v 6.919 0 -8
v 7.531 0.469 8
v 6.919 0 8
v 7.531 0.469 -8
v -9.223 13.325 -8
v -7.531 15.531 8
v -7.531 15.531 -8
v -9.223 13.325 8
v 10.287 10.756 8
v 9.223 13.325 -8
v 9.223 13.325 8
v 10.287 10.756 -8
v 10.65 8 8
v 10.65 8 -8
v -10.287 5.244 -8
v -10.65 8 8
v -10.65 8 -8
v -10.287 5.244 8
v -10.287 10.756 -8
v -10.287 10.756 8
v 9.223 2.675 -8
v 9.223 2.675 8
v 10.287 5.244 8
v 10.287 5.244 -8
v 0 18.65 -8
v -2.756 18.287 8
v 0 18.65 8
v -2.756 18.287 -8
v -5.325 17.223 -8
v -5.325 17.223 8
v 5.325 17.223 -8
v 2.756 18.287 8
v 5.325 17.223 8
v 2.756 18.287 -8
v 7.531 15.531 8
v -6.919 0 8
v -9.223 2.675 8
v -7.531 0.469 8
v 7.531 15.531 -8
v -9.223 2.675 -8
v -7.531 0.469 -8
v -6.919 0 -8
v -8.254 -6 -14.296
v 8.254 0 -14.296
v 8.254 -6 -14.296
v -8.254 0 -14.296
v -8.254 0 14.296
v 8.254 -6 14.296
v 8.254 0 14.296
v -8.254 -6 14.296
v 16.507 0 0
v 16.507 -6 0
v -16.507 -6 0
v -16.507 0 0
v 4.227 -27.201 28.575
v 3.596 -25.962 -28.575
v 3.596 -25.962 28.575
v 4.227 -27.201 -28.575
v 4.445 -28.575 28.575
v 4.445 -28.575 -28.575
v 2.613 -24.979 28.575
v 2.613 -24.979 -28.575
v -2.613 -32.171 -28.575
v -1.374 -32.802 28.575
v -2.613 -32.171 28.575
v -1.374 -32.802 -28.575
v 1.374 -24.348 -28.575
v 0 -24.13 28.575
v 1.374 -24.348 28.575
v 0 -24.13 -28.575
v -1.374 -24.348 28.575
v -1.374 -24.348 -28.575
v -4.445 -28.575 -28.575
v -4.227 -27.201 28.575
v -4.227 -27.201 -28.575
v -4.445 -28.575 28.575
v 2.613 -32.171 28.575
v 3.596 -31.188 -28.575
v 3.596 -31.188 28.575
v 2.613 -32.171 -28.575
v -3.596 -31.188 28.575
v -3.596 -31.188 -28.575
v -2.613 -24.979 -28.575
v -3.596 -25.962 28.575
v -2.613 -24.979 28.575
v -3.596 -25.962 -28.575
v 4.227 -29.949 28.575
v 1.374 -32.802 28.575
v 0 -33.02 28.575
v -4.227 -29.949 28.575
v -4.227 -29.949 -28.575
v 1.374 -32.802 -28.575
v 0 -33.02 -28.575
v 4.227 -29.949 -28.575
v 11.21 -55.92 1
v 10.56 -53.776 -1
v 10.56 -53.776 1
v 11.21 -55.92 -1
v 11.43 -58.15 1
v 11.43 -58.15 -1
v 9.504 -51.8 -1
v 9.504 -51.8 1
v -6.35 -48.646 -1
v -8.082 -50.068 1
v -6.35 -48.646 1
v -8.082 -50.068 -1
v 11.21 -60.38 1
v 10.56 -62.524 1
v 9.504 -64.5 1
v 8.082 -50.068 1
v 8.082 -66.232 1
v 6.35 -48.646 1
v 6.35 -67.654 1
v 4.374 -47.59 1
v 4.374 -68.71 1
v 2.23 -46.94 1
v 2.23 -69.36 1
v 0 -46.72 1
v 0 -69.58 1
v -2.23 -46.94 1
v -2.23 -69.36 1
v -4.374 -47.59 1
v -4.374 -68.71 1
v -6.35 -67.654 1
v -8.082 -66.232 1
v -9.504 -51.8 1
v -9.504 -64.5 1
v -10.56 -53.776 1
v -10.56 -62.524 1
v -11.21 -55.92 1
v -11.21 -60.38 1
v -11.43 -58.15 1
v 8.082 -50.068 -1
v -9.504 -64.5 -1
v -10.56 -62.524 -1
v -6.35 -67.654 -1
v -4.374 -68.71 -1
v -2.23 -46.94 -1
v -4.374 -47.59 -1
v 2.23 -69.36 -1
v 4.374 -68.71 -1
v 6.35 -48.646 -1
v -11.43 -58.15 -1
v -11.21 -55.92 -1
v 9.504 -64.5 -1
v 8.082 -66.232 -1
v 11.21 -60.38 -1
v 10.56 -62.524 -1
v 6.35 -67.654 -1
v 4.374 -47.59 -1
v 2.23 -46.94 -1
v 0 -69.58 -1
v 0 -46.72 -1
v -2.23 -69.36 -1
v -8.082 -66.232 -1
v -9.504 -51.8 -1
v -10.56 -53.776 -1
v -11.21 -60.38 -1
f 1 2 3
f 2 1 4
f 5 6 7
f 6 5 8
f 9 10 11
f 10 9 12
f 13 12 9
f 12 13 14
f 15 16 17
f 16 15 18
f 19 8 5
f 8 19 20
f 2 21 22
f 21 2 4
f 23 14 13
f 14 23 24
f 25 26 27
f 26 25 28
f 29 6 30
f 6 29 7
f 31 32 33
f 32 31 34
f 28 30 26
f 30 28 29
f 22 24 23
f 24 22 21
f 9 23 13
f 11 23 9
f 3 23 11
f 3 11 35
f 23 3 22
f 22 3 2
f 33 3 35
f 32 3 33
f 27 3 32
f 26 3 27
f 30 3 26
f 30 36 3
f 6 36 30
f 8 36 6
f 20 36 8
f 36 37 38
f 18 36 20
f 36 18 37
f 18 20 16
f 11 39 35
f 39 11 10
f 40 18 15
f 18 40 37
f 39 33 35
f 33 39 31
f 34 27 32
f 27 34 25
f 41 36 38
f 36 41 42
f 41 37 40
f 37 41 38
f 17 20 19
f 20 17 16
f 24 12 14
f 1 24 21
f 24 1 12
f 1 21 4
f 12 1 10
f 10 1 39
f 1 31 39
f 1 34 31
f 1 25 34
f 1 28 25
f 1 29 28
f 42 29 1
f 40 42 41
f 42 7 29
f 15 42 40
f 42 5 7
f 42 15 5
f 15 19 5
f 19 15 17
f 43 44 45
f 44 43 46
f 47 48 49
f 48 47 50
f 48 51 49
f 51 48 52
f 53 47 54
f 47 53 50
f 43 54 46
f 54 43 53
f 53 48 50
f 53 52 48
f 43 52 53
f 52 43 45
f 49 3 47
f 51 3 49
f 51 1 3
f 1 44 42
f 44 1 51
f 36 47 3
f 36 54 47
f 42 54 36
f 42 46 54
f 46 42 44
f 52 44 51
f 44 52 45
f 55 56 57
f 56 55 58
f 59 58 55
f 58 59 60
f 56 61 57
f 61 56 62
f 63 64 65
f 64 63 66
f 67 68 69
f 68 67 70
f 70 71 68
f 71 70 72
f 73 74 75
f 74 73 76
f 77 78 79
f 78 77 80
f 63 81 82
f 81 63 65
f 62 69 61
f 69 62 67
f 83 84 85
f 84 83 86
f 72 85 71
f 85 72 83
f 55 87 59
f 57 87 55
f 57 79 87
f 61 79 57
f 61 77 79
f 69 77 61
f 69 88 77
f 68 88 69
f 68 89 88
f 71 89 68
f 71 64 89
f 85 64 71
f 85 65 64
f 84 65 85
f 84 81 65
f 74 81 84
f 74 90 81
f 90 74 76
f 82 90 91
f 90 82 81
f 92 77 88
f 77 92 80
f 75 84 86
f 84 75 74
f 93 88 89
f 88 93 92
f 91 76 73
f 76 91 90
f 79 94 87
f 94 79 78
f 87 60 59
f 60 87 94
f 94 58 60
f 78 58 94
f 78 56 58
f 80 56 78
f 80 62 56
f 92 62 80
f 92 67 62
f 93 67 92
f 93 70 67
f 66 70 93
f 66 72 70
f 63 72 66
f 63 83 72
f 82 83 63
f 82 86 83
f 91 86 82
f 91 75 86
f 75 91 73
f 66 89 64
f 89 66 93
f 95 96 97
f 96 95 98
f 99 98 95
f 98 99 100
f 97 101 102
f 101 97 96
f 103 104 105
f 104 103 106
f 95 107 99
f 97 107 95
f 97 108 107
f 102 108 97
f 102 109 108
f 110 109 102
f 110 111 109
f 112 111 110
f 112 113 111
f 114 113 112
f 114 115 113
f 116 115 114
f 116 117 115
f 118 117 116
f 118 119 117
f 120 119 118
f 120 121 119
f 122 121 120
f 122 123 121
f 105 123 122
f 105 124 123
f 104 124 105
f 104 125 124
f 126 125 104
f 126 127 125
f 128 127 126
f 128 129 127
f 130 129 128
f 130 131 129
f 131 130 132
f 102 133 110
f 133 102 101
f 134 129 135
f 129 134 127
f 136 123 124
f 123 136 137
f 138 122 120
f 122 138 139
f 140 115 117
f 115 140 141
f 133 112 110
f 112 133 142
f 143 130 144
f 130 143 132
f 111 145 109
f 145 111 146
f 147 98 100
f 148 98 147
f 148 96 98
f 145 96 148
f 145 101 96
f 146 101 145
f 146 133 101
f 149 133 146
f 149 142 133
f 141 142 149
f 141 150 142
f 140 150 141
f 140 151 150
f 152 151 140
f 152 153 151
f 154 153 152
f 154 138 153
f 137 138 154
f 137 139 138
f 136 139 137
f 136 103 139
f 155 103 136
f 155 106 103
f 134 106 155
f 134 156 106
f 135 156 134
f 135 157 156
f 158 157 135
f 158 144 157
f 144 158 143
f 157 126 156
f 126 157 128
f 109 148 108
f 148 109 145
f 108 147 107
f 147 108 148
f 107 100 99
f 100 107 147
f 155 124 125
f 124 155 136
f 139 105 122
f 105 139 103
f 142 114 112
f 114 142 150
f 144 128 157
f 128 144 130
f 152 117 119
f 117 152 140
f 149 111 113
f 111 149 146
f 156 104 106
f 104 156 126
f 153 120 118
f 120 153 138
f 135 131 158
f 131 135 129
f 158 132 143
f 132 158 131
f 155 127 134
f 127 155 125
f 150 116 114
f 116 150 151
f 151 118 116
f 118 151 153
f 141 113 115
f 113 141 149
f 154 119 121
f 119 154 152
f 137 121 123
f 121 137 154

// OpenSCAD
// Auto-generated by scripts/author_from_manifest.py (Phase D.3).
// Source: data/phase_d_manifest.json (sku_intent='tyco-ec11-pendent-k112-155f').
// Do not hand-edit — regenerate from the manifest.
//
// @part tyco_ec11_pendent_k112_155f
// @kind sprinkler_head
// @category head.pendant.k112
// @display-name "Tyco EC-11 Extended Coverage Pendent K11.2 155°F"
// @mfg tyco_fire_protection
// @mfg-pn EC-11
// @listing UL FM
// @hazard-classes OH1 OH2
// @price-usd 34.00
// @install-minutes 10
// @crew journeyman
// @k-factor 11.2
// @orientation pendant
// @response standard
// @temperature 155F
// @param size_in number default=0.5 label="Size" unit="in"
// @port inlet position=[0,0.014,0] direction=[0,1,0] style=NPT_threaded size_in=0.75 role=drop

size_in = 0.5;
k_factor = 11.2;

length_mm   = 57.15;
body_dia_mm = 25.40;
thread_od   = 21.3;
thread_len  = 16;
deflector_d = body_dia_mm * 0.9;

 union() {
    translate([0, thread_len/2, 0])
        cylinder(h = thread_len, d = thread_od, center = true, $fn = 24);
    translate([0, -3, 0])
        rotate([90, 0, 0])
        cylinder(h = 6, d = thread_od * 1.55, $fn = 6, center = true);
    translate([0, -length_mm/2, 0])
        cylinder(h = length_mm, d = body_dia_mm * 0.35, center = true, $fn = 20);
    translate([0, -length_mm - 1, 0])
        cylinder(h = 2, d = deflector_d, center = true, $fn = 32);
}
